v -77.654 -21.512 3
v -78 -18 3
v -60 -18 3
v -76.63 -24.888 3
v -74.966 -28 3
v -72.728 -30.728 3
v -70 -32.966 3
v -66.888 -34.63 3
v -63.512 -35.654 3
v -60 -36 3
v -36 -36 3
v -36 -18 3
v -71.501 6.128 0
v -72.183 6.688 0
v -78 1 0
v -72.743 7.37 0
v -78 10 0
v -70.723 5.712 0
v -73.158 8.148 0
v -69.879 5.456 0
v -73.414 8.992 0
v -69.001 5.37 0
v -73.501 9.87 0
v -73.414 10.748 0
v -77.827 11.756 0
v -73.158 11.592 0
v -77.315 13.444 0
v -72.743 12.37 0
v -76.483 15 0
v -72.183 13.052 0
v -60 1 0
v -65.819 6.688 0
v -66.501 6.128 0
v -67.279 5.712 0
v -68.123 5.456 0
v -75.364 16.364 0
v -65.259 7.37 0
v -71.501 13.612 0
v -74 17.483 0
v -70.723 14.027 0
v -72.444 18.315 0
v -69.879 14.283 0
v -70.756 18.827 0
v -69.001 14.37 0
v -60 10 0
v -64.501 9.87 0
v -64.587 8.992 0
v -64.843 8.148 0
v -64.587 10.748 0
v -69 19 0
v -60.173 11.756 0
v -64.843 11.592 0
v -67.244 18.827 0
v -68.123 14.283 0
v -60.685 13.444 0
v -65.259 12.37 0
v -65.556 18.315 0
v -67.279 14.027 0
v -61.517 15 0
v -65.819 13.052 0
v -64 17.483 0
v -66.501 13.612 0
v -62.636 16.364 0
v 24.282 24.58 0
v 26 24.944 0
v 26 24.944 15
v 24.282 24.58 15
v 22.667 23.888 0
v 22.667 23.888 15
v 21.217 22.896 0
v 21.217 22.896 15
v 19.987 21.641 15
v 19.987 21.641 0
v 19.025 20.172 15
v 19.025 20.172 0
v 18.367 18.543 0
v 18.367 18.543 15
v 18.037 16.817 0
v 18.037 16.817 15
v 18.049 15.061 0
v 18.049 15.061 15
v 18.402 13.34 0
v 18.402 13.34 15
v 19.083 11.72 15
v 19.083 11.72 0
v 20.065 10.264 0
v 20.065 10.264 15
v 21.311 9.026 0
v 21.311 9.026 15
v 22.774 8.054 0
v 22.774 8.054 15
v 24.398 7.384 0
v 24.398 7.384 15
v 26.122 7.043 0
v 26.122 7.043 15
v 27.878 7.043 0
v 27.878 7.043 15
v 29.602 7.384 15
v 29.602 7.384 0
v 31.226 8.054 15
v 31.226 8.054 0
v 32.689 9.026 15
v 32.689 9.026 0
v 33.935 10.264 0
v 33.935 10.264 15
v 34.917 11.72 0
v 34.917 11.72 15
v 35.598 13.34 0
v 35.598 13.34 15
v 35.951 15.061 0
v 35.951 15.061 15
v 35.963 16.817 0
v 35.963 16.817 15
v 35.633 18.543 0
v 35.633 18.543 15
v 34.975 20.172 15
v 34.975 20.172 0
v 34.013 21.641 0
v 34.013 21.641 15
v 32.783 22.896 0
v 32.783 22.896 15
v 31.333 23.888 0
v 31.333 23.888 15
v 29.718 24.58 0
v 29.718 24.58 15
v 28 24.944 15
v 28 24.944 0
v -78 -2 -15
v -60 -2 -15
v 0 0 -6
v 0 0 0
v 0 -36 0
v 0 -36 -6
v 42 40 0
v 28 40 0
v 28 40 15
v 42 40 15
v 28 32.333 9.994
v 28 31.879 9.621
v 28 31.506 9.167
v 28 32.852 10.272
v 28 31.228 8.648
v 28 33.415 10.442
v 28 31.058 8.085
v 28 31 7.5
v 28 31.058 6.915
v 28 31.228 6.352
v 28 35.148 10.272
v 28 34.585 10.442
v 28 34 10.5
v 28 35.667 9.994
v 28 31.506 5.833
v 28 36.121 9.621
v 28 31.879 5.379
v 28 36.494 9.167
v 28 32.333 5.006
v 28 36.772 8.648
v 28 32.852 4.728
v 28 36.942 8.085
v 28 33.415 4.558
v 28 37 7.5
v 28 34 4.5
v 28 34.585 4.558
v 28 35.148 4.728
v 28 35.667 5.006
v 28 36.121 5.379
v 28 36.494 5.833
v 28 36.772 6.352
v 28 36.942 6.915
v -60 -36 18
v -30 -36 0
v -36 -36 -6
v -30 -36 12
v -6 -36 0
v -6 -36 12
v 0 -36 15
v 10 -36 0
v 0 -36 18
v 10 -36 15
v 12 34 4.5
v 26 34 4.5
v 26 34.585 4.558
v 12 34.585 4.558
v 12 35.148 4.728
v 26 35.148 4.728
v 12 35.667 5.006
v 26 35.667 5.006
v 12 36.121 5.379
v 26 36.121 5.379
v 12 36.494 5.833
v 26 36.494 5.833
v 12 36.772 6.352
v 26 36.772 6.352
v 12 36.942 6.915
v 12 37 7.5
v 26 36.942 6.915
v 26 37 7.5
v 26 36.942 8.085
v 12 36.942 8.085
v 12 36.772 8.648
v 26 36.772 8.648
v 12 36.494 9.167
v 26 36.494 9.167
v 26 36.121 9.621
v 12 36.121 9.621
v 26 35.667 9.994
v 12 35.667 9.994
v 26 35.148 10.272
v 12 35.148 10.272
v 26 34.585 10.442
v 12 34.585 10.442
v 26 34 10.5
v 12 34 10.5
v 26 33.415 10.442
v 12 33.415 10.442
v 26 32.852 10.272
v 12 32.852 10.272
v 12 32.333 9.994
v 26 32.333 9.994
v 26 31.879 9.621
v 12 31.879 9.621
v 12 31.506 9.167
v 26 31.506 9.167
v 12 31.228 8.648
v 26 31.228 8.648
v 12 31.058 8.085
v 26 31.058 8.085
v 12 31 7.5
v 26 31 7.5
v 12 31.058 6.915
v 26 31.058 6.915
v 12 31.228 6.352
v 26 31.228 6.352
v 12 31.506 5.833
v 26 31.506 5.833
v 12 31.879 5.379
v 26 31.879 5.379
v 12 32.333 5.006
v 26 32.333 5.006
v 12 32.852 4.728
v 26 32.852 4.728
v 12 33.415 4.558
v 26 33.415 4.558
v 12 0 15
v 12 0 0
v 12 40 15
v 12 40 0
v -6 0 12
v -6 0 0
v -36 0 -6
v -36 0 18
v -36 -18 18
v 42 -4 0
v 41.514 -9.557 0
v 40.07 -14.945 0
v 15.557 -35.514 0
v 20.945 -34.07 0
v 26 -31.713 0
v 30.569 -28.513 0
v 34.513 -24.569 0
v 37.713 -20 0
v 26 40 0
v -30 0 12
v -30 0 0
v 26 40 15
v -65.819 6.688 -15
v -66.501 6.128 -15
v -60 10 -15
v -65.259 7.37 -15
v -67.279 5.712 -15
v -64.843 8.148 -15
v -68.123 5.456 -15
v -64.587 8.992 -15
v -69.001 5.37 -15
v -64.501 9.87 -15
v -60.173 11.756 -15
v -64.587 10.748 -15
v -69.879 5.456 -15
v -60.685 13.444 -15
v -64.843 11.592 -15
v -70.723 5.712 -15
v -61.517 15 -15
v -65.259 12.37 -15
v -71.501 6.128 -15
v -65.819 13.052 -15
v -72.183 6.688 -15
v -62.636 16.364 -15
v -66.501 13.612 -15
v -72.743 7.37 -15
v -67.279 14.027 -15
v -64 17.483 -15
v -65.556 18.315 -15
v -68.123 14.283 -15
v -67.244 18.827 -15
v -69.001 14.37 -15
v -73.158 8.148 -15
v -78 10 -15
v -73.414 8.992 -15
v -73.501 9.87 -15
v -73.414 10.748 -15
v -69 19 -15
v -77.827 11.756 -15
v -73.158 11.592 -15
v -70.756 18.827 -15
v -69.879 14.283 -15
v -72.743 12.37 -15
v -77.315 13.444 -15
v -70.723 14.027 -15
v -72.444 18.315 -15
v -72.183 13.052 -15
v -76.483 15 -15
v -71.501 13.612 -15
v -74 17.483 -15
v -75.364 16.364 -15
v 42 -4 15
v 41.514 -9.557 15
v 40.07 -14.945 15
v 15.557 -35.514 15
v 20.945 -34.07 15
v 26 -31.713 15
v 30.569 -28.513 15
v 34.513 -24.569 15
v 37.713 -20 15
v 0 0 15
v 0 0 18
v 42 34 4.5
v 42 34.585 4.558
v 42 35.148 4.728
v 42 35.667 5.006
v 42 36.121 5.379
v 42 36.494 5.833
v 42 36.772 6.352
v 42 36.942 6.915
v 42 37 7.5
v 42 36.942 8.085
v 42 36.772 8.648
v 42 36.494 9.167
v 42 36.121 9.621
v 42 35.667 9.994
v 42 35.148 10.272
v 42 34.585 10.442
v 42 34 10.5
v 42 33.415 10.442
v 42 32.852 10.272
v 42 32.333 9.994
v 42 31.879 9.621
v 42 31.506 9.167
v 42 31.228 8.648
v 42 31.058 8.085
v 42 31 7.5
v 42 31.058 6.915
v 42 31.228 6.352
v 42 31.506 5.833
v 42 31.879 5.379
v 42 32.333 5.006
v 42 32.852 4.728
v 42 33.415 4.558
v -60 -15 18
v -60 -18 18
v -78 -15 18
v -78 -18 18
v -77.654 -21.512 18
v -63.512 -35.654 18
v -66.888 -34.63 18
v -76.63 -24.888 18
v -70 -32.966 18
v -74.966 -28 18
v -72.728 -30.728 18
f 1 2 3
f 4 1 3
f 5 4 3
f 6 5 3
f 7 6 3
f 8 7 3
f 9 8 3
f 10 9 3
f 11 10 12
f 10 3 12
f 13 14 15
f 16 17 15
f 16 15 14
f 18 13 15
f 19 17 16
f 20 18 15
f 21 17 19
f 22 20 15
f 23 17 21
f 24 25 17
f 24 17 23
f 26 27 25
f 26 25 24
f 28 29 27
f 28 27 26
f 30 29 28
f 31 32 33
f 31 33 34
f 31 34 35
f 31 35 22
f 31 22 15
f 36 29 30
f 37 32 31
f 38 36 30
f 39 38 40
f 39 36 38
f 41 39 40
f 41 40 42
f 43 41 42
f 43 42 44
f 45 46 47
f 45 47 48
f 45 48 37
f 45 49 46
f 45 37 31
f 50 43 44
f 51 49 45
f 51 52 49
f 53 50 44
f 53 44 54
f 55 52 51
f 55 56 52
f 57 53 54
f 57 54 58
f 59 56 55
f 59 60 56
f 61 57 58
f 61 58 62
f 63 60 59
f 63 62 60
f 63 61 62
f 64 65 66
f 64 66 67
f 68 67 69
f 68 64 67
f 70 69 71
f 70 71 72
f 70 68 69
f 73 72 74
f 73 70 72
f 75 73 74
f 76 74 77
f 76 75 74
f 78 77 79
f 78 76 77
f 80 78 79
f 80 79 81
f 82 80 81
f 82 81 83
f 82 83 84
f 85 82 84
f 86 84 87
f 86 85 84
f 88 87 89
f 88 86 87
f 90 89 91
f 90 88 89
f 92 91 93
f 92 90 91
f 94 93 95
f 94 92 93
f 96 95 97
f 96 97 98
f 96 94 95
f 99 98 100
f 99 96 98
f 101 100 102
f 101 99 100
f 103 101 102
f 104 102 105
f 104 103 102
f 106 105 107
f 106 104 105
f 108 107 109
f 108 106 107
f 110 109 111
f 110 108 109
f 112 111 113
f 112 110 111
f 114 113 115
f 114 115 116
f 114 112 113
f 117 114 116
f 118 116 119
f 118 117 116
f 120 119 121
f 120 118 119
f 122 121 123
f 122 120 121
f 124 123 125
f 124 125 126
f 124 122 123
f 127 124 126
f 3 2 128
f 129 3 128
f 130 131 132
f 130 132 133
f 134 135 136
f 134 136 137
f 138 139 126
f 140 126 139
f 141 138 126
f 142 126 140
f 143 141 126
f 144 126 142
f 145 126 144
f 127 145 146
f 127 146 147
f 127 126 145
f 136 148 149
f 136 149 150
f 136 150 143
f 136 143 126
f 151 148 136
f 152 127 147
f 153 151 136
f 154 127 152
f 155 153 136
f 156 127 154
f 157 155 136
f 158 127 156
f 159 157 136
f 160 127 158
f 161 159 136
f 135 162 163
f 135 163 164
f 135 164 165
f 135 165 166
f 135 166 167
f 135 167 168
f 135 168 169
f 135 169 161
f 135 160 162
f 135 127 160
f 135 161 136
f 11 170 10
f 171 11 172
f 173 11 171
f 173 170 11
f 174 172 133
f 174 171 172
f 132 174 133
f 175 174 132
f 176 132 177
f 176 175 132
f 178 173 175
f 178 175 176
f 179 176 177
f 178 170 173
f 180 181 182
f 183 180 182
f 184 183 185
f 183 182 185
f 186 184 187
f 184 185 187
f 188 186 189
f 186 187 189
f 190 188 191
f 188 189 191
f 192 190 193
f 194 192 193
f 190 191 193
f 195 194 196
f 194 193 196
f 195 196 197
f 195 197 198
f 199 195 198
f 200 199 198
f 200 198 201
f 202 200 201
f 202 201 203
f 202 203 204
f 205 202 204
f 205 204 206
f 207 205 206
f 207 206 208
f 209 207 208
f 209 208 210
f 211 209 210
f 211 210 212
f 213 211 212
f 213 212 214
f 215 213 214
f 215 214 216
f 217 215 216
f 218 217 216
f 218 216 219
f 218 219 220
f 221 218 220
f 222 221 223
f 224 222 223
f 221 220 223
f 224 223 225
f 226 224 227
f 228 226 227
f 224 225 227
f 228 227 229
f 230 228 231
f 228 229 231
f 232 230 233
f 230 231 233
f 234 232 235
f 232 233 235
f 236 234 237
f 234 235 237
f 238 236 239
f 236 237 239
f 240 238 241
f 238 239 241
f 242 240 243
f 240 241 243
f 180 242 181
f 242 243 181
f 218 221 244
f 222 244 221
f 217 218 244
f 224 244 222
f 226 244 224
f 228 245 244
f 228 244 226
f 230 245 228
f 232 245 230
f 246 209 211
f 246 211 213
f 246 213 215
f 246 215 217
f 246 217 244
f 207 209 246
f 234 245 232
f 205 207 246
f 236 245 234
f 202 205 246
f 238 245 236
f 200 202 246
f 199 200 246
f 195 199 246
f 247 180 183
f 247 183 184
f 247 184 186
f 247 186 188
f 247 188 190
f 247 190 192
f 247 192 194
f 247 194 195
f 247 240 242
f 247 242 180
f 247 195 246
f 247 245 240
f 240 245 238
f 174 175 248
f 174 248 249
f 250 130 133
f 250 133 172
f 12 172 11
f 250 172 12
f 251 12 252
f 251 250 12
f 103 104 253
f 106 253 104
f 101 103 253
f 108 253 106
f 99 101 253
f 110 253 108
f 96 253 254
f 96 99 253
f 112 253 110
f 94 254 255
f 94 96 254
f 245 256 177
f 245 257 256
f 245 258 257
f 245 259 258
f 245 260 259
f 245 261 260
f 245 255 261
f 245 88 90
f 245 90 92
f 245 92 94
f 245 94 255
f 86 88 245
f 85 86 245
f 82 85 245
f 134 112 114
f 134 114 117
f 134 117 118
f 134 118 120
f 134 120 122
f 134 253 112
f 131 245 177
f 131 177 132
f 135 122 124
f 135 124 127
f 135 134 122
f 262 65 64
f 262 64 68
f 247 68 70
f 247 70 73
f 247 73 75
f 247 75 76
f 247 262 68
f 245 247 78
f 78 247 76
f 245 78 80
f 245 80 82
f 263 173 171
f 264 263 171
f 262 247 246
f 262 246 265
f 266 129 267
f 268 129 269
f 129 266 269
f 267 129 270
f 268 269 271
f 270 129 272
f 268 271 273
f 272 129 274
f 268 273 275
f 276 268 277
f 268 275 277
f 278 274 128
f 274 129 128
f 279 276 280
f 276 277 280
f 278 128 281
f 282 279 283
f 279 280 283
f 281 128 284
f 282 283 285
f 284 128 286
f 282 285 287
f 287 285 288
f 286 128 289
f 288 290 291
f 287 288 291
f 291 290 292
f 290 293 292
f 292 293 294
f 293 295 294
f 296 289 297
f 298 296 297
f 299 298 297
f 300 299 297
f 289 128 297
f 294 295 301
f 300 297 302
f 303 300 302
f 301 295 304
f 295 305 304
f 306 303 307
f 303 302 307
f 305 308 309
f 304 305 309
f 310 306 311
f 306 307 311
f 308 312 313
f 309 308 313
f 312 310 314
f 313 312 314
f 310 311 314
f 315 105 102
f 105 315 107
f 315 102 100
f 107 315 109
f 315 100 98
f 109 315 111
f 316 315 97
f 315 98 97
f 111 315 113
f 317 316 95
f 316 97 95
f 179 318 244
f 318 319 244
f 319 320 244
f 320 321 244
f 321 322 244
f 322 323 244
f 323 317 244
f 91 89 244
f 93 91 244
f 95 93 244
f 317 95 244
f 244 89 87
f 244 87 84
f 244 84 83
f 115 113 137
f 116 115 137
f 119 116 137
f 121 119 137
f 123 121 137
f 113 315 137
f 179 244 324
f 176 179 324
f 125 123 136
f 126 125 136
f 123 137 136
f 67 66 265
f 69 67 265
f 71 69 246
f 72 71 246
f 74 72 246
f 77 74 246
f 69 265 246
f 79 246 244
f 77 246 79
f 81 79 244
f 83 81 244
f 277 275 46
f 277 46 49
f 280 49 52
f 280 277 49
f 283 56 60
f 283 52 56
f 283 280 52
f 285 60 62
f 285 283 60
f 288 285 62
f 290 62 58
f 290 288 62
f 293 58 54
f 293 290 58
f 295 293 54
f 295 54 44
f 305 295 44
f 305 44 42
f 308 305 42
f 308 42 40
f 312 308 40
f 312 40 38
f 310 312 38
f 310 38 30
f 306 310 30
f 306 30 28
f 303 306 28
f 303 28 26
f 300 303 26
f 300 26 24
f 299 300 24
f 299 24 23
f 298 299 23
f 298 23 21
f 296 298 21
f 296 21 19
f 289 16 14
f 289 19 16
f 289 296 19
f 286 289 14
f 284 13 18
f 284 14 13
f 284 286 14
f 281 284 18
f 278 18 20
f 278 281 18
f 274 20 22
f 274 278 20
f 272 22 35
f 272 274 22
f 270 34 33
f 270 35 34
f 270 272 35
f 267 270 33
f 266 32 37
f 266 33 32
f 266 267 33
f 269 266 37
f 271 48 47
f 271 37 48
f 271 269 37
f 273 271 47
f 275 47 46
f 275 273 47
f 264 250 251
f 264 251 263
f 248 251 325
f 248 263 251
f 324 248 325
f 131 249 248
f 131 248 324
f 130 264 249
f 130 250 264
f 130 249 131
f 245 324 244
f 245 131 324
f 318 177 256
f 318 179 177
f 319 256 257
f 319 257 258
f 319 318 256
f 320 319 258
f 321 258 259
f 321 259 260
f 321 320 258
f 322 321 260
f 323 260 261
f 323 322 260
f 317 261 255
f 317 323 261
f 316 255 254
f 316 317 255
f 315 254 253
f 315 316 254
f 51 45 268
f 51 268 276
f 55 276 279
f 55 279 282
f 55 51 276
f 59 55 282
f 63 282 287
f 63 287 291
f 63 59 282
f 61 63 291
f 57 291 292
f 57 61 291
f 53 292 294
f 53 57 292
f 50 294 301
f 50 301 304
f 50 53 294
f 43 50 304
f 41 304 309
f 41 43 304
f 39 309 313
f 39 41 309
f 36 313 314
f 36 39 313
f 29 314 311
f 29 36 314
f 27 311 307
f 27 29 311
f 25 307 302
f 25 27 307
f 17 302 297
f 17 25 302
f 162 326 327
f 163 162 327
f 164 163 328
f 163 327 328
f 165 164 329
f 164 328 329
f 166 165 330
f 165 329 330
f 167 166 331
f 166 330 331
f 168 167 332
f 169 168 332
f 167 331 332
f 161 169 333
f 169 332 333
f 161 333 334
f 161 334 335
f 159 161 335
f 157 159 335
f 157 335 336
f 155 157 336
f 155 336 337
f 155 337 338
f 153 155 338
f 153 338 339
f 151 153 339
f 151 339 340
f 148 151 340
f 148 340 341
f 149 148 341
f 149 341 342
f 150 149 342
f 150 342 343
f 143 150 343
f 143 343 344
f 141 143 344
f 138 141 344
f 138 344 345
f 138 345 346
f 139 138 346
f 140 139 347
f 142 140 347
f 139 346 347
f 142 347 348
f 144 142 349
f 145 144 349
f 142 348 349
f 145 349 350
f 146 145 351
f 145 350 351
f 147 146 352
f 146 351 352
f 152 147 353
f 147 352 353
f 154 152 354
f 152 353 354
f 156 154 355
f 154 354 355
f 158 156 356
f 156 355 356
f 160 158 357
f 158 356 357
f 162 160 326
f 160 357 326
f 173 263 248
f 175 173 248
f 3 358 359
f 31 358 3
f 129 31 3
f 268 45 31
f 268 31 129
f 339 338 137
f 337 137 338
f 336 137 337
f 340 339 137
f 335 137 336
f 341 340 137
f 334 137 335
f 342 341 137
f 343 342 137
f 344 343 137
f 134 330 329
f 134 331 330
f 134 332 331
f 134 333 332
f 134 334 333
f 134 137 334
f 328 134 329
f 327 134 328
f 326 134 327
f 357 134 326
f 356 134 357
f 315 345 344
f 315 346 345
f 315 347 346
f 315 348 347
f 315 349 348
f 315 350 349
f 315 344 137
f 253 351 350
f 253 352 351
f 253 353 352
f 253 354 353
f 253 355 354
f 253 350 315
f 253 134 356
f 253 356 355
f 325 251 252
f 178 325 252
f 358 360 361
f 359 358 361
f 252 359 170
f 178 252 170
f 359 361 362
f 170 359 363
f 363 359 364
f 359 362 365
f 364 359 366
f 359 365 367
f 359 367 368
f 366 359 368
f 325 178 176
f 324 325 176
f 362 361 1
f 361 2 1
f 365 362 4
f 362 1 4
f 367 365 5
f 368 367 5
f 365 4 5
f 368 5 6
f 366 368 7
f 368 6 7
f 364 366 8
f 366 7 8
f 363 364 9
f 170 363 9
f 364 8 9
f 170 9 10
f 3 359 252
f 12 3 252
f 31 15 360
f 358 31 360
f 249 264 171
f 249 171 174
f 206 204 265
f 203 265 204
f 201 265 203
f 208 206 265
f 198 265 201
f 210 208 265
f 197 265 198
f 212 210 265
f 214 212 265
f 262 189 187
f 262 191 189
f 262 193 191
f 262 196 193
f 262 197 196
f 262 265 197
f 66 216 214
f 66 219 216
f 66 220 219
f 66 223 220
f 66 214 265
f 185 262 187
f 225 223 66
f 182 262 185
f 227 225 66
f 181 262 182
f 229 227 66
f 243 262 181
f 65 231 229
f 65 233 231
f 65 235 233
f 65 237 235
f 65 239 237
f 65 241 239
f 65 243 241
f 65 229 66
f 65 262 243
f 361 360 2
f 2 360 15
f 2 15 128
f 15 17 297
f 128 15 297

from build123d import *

# Parameters (mm, degrees)
BOSS_EXTRUDE1_DEPTH     = 15
SKETCH2_W               = 24
SKETCH2_H               = 12
BOSS_EXTRUDE2_DEPTH     = 36
SKETCH3_W               = 42
SKETCH3_H               = 18
BOSS_EXTRUDE3_DEPTH     = 15
SKETCH4_R               = 3
CUT_EXTRUDE1_DEPTH      = 34
BOSS_EXTRUDE5_DEPTH     = 18
SKETCH7_R               = 9
BOSS_EXTRUDE8_DEPTH     = 15
CUT_EXTRUDE2_DEPTH      = 90.487429285
CUT_EXTRUDE2_DEPTH_BACK = 90.487429285
SKETCH8_R               = 4.5
FILLET1_R               = 18
FILLET2_R               = 32


with BuildPart() as part:
    # Sketch1 → Boss-Extrude1 (new body)
    with BuildSketch(Plane.XY):
        with BuildLine():
            Line((0, 0), (12, 0))
            Line((12, 0), (12, 40))
            Line((12, 40), (26, 40))
            Line((26, 40), (26, 24.94427191))
            ThreePointArc((26, 24.94427191), (27, 7), (28, 24.94427191))
            Line((28, 24.94427191), (28, 40))
            Line((28, 40), (42, 40))
            Line((42, 40), (42, -36))
            Line((42, -36), (0, -36))
            Line((0, -36), (0, 0))
        make_face()
    extrude(amount=BOSS_EXTRUDE1_DEPTH)

    # Sketch2 → Boss-Extrude2 (add)
    with BuildSketch(Plane(origin=(0, 0, 0), x_dir=(1, 0, 0), z_dir=(0, 1, 0))):
        Polygon((-36, -18), (0, -18), (0, -15), (0, 0), (0, 6), (-36, 6), align=None)
        with Locations((-18, -6)):
            Rectangle(SKETCH2_W, SKETCH2_H, mode=Mode.SUBTRACT)
    extrude(amount=-BOSS_EXTRUDE2_DEPTH)

    # Sketch3 → Boss-Extrude3 (add)
    with BuildSketch(Plane.XY.offset(18)):
        with Locations((-57, -27)):
            Rectangle(SKETCH3_W, SKETCH3_H)
    extrude(amount=-BOSS_EXTRUDE3_DEPTH)

    # Sketch4 → Cut-Extrude1 (cut)
    with BuildSketch(Plane(origin=(42, 0, 0), x_dir=(0, 0, -1), z_dir=(1, 0, 0))):
        with Locations((-7.5, 34)):
            Circle(SKETCH4_R)
    extrude(amount=-CUT_EXTRUDE1_DEPTH, mode=Mode.SUBTRACT)

    # Sketch6 → Boss-Extrude5 (add)
    with BuildSketch(Plane.ZY.offset(78)):
        Polygon((3, -18), (-15, -2), (-15, 10), (0, 10), (0, 1), (18, -15), (18, -18), align=None)
    extrude(amount=-BOSS_EXTRUDE5_DEPTH)

    # Sketch7 → Boss-Extrude8 (add)
    with BuildSketch(Plane.XY):
        with Locations((-69, 10)):
            Circle(SKETCH7_R)
    extrude(amount=-BOSS_EXTRUDE8_DEPTH)

    # Sketch8 → Cut-Extrude2 (cut, two sides: drawn at the far end of the back side and taken through both)
    with BuildSketch(Plane.XY.offset(-CUT_EXTRUDE2_DEPTH_BACK)):
        with Locations((-69.000940425, 9.869897064)):
            Circle(SKETCH8_R)
    extrude(amount=CUT_EXTRUDE2_DEPTH + CUT_EXTRUDE2_DEPTH_BACK, mode=Mode.SUBTRACT)

    # Fillet1
    fillet1_edges = [part.edges().sort_by_distance(p)[0] for p in [
        (-78, -36, 10.5),
    ]]
    fillet(fillet1_edges, radius=FILLET1_R)

    # Fillet2
    fillet2_edges = [part.edges().sort_by_distance(p)[0] for p in [
        (42, -36, 7.5),
    ]]
    fillet(fillet2_edges, radius=FILLET2_R)


solid = part.part
